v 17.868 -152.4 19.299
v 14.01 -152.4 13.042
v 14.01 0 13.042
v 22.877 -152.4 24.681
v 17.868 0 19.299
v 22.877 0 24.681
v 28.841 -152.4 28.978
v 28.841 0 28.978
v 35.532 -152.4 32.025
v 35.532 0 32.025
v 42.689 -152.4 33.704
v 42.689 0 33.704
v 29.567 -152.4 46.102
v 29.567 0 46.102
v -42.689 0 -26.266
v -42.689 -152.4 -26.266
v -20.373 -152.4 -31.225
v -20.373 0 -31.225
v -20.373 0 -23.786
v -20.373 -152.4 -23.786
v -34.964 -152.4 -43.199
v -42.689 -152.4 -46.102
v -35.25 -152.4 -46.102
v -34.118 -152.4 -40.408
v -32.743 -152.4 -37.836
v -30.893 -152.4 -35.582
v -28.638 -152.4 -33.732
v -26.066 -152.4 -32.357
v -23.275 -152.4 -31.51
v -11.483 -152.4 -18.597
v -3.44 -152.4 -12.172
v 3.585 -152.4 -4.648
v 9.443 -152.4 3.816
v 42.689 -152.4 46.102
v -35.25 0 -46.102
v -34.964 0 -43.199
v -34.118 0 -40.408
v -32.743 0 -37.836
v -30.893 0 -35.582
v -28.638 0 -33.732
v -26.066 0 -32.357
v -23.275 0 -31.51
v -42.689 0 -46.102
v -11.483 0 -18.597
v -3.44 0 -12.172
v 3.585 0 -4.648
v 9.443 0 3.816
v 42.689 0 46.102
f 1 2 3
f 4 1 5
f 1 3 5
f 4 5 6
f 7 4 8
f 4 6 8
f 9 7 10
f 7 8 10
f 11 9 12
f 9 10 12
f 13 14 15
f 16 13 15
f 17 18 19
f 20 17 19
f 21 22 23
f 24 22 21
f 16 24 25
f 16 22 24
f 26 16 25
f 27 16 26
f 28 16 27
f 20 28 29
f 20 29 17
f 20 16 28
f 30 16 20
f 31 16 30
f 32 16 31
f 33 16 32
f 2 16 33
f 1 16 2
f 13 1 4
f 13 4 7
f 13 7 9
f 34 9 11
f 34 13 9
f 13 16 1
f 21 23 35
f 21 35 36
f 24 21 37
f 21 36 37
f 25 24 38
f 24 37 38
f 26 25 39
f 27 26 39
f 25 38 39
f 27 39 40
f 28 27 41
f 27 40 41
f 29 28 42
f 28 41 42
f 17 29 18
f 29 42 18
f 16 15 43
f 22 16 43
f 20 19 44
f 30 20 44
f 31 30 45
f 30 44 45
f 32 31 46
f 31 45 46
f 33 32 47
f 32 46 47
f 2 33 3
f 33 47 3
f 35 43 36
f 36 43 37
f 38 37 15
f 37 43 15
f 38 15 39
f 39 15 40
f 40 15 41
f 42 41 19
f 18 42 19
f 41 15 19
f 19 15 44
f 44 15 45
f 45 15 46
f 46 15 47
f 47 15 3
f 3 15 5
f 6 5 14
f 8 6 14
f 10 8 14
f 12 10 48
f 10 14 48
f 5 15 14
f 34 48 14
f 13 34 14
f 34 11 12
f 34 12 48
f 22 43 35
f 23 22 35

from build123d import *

# Parameters (mm, degrees)
F1_DEPTH = 152.4


# Not quite as in the source:
# - ends of sketch curves that miss each other by under 0.0002 mm in the source are joined


with BuildPart() as f1:
    # F0 (on Front) → F1 (new body)
    with BuildSketch(Plane.XZ):
        with BuildLine():
            Line((42.688764, 33.7040728), (42.688764, 46.1017112))
            Line((42.688764, 46.1017112), (29.5671748, 46.1017112))
            Line((29.5671748, 46.1017112), (-42.688764, -26.265505))
            Line((-42.688764, -26.265505), (-42.688764, -46.1017112))
            Line((-42.688764, -46.1017112), (-35.2501708, -46.1017112))
            ThreePointArc((-35.2501708, -46.1017112), (-30.8927586674, -35.5819877326), (-20.3730352, -31.2245756))
            Line((-20.3730352, -31.2245756), (-20.3730352, -23.7859824))
            ThreePointArc((-20.3730352, -23.7859824), (0.2093797229, -8.5380689207), (14.0097452821, 13.0416577293))
            ThreePointArc((14.0097452821, 13.0416577293), (25.7531505711, 26.9762086577), (42.688764, 33.7040728))
        make_face()
    extrude(amount=F1_DEPTH)


solid = f1.part
